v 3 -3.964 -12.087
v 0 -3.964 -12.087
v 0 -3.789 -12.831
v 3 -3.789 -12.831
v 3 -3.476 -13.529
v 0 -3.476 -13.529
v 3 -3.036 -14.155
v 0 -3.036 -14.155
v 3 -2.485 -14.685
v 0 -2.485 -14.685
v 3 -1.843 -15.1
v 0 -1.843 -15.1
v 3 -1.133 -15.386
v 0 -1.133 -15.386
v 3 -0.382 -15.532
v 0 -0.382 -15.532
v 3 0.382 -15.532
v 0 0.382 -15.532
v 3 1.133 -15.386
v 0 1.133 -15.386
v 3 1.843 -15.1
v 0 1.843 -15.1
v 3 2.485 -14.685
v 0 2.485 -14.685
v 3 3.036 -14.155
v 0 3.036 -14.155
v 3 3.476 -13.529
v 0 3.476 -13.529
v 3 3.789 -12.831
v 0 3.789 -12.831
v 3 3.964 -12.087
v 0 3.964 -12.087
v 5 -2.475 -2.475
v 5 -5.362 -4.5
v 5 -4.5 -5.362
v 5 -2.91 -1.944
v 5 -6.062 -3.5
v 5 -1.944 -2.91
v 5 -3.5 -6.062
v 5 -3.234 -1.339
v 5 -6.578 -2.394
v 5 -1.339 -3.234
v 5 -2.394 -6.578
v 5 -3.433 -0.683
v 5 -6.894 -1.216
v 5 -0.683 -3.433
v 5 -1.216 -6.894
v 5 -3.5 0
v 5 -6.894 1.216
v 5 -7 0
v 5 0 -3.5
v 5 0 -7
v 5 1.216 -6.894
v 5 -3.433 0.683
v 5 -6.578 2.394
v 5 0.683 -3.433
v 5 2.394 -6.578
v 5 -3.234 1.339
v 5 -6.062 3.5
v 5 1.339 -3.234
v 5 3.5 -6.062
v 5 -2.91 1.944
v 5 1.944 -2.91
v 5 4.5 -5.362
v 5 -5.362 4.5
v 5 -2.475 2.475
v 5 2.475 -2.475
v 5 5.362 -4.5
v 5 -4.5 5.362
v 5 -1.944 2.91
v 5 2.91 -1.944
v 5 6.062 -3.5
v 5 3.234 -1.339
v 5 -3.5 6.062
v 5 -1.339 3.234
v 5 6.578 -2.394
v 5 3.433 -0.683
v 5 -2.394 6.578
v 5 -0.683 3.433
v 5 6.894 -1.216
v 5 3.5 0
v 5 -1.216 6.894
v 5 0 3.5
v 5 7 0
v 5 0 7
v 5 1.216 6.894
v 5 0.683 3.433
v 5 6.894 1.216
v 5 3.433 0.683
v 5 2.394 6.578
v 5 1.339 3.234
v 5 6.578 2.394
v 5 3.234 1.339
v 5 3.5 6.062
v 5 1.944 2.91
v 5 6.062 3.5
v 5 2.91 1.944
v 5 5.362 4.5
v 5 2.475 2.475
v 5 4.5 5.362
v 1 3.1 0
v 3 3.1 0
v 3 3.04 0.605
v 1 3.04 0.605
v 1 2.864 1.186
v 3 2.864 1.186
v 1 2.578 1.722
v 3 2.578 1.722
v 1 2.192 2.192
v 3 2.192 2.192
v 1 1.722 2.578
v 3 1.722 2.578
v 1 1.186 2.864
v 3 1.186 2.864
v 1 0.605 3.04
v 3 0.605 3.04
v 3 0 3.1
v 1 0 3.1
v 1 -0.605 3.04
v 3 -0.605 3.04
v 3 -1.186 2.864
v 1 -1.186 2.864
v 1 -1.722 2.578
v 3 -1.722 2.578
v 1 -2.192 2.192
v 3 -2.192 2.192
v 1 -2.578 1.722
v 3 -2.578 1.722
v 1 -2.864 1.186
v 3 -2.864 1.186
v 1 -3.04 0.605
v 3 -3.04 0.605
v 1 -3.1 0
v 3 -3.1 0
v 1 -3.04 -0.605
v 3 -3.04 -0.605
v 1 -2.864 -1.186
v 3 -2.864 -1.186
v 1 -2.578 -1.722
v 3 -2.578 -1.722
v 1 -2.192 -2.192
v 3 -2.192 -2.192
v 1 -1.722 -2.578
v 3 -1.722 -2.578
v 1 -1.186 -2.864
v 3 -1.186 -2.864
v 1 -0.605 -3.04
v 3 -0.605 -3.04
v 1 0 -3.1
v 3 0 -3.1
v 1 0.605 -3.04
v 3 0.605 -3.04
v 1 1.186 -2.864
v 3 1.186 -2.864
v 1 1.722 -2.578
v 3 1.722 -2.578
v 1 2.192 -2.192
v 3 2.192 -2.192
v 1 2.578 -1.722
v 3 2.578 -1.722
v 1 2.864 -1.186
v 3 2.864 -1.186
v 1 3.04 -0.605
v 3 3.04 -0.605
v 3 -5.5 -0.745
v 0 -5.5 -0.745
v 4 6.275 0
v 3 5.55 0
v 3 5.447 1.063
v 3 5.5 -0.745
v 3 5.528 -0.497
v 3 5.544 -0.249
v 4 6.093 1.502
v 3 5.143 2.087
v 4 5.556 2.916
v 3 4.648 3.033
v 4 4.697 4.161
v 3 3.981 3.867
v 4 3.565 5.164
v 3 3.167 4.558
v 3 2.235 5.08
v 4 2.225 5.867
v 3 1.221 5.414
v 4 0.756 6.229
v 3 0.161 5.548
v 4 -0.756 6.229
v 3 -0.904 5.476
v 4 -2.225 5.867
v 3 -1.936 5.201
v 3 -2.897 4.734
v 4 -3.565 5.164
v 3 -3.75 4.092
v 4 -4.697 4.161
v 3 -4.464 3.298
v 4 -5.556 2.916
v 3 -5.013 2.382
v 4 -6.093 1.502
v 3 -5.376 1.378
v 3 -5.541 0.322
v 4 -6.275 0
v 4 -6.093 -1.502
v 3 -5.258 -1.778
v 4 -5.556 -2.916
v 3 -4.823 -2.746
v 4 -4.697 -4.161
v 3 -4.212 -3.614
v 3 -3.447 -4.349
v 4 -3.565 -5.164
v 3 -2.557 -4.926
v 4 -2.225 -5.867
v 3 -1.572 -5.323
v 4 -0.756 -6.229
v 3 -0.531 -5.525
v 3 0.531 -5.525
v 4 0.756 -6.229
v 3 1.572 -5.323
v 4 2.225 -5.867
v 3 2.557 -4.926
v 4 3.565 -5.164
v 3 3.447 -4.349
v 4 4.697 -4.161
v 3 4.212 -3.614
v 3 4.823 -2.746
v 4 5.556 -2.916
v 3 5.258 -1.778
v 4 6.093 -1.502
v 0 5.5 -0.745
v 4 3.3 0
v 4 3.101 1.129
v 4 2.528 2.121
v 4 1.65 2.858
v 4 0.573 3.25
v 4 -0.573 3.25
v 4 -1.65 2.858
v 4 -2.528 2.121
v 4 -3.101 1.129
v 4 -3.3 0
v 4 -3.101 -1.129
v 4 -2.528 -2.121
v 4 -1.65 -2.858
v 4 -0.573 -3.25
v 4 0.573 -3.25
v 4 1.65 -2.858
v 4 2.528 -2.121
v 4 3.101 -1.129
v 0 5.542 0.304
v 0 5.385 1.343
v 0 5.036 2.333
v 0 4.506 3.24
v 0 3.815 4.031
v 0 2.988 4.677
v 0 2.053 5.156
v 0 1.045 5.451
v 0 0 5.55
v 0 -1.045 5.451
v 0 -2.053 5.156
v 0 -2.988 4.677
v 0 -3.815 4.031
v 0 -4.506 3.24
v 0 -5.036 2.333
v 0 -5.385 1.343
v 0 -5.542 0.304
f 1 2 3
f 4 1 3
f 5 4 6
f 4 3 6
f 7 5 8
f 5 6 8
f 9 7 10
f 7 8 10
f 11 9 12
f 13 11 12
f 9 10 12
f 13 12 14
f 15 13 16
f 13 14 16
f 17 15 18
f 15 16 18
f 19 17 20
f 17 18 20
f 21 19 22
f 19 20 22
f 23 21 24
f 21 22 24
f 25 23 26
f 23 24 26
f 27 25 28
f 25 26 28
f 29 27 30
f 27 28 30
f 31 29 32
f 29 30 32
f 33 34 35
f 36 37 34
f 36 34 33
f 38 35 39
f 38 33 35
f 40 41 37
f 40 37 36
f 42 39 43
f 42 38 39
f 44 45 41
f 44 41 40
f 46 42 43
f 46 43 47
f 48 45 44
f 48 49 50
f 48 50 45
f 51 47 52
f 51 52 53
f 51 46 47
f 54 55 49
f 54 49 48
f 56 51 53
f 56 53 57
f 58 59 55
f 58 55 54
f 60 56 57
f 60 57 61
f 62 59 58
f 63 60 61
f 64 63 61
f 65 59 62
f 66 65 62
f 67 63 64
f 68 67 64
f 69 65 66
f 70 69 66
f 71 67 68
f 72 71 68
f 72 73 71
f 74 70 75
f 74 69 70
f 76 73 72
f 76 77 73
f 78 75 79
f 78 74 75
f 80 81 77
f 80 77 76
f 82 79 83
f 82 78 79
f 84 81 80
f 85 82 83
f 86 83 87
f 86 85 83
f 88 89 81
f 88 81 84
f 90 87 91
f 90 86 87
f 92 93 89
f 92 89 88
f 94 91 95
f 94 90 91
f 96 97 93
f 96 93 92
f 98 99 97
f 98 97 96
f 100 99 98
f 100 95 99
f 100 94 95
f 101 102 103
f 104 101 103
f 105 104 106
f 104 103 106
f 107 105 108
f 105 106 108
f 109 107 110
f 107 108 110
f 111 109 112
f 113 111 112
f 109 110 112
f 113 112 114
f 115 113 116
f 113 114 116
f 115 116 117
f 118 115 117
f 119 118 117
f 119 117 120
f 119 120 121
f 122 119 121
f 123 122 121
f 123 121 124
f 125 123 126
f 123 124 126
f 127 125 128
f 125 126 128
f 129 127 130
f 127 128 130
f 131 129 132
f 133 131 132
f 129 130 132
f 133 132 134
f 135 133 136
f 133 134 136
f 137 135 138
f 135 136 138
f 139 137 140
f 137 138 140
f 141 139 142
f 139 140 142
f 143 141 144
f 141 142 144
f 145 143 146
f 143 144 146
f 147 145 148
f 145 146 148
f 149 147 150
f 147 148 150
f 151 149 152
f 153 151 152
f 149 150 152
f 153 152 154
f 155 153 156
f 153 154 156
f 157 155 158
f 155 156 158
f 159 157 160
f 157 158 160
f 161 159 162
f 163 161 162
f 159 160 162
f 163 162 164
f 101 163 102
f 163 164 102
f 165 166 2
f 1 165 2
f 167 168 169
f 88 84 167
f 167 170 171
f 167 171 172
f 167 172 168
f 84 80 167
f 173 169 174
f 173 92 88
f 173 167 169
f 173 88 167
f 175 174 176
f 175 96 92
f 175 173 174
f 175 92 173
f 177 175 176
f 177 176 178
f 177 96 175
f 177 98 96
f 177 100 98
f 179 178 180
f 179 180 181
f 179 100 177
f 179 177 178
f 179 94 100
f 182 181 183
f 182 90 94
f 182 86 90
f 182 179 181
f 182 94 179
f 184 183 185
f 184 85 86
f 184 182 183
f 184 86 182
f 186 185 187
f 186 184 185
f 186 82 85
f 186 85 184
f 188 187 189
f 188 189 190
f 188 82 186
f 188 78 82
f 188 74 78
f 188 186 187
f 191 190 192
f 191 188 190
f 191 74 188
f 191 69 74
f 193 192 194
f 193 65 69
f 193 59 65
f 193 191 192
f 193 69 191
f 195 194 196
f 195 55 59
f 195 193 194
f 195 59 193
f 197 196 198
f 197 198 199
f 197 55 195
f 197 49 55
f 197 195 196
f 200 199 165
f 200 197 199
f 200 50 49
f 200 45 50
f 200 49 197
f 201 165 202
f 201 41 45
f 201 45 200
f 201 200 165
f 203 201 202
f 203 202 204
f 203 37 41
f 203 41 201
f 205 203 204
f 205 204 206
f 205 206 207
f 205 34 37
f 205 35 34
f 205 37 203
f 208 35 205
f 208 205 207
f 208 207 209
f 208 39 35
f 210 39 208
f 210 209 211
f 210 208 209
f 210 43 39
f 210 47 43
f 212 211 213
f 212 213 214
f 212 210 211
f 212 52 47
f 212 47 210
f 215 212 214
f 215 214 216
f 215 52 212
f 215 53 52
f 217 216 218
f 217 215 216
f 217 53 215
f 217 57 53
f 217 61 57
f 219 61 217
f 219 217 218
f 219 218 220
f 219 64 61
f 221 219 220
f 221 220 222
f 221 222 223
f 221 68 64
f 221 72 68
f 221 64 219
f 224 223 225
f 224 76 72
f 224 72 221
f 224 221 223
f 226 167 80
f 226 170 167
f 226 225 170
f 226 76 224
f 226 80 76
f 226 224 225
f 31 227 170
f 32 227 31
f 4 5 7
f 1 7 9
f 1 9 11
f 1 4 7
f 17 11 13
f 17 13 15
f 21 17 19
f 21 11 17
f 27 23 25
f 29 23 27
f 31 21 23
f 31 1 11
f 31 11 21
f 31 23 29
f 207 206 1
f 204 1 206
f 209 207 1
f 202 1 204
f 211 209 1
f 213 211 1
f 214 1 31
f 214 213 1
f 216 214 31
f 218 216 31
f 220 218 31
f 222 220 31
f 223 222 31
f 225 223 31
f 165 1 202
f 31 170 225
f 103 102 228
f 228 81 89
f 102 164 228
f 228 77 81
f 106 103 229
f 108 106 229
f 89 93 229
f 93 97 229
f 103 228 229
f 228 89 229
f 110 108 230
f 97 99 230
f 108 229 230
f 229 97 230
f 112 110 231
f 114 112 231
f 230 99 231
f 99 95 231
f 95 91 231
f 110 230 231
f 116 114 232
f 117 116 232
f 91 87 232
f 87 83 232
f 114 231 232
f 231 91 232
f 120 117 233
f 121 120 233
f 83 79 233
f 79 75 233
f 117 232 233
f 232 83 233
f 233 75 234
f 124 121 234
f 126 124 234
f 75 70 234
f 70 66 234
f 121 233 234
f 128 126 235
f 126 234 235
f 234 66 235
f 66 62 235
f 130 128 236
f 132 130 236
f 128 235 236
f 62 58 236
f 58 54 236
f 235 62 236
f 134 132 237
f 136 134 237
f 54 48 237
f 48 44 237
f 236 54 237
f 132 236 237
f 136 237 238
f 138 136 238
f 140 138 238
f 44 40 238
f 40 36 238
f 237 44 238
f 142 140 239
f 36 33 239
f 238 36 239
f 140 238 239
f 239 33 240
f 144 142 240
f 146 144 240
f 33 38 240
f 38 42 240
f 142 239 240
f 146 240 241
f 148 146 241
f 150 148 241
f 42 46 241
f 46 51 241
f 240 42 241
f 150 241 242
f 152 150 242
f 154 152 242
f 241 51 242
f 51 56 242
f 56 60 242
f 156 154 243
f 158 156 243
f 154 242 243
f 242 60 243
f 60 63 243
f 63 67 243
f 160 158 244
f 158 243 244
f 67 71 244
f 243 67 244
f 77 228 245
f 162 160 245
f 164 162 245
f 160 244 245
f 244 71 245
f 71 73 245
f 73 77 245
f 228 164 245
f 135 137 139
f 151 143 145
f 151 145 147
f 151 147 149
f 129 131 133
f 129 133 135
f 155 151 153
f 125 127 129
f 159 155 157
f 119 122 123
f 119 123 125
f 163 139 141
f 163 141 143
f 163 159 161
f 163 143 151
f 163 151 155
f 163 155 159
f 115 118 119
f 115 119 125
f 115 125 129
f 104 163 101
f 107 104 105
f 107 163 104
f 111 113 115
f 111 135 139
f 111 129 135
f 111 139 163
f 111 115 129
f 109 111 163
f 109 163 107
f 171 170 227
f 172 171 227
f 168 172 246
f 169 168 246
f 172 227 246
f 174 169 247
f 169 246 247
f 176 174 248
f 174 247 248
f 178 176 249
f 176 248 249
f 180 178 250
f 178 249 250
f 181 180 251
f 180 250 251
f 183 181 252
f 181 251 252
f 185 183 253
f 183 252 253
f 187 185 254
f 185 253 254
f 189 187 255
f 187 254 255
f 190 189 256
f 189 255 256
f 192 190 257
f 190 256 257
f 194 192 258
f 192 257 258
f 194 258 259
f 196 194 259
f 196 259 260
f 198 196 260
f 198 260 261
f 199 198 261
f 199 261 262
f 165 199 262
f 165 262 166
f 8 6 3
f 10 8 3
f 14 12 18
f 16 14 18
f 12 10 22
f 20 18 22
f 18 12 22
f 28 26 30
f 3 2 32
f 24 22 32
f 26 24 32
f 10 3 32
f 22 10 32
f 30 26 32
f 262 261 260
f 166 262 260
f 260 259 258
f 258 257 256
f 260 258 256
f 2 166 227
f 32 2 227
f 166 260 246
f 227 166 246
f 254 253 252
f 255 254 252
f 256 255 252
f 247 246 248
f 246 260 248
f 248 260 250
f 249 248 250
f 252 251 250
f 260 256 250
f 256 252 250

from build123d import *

# Parameters (mm, degrees)
PAD_DEPTH    = 3
SKETCH001_R  = 3.1
POCKET_DEPTH = 2
SKETCH004_R  = 3.1
SKETCH005_R  = 3.5
SKETCH002_R  = 5.55
SKETCH003_R  = 7


with BuildPart() as tasche_magnet:
    # Sketch → Pad (new body)
    with BuildSketch(Plane.YZ):
        with BuildLine():
            ThreePointArc((5.499797, -0.744805), (1e-06, 5.55), (-5.499797, -0.744803))
            Line((-5.499797, -0.744803), (-3.963815, -12.086812))
            ThreePointArc((-3.963815, -12.086812), (-1e-06, -15.55), (3.963815, -12.086815))
            Line((5.499797, -0.744805), (3.963815, -12.086815))
        make_face()
    extrude(amount=PAD_DEPTH)

    # Sketch001 → Pocket (cut)
    with BuildSketch(Plane.YZ.offset(3)):
        Circle(SKETCH001_R)
    extrude(amount=-POCKET_DEPTH, mode=Mode.SUBTRACT)


with BuildPart() as loft001:
    # Sketch004 → Loft001 section 0
    with BuildSketch(Plane.YZ.offset(3)):
        Circle(SKETCH004_R)
    # Sketch005 → Loft001 section 1
    with BuildSketch(Plane.YZ.offset(5)):
        Circle(SKETCH005_R)
    loft()


with BuildPart() as fusion:
    # Sketch002 → Loft section 0
    with BuildSketch(Plane.YZ.offset(3)):
        Circle(SKETCH002_R)
    # Sketch003 → Loft section 1
    with BuildSketch(Plane.YZ.offset(5)):
        Circle(SKETCH003_R)
    loft()

    # Cut: cut Loft001
    add(loft001.part, mode=Mode.SUBTRACT)

    # Fusion: union Tasche Magnet
    add(tasche_magnet.part)


solid = fusion.part
